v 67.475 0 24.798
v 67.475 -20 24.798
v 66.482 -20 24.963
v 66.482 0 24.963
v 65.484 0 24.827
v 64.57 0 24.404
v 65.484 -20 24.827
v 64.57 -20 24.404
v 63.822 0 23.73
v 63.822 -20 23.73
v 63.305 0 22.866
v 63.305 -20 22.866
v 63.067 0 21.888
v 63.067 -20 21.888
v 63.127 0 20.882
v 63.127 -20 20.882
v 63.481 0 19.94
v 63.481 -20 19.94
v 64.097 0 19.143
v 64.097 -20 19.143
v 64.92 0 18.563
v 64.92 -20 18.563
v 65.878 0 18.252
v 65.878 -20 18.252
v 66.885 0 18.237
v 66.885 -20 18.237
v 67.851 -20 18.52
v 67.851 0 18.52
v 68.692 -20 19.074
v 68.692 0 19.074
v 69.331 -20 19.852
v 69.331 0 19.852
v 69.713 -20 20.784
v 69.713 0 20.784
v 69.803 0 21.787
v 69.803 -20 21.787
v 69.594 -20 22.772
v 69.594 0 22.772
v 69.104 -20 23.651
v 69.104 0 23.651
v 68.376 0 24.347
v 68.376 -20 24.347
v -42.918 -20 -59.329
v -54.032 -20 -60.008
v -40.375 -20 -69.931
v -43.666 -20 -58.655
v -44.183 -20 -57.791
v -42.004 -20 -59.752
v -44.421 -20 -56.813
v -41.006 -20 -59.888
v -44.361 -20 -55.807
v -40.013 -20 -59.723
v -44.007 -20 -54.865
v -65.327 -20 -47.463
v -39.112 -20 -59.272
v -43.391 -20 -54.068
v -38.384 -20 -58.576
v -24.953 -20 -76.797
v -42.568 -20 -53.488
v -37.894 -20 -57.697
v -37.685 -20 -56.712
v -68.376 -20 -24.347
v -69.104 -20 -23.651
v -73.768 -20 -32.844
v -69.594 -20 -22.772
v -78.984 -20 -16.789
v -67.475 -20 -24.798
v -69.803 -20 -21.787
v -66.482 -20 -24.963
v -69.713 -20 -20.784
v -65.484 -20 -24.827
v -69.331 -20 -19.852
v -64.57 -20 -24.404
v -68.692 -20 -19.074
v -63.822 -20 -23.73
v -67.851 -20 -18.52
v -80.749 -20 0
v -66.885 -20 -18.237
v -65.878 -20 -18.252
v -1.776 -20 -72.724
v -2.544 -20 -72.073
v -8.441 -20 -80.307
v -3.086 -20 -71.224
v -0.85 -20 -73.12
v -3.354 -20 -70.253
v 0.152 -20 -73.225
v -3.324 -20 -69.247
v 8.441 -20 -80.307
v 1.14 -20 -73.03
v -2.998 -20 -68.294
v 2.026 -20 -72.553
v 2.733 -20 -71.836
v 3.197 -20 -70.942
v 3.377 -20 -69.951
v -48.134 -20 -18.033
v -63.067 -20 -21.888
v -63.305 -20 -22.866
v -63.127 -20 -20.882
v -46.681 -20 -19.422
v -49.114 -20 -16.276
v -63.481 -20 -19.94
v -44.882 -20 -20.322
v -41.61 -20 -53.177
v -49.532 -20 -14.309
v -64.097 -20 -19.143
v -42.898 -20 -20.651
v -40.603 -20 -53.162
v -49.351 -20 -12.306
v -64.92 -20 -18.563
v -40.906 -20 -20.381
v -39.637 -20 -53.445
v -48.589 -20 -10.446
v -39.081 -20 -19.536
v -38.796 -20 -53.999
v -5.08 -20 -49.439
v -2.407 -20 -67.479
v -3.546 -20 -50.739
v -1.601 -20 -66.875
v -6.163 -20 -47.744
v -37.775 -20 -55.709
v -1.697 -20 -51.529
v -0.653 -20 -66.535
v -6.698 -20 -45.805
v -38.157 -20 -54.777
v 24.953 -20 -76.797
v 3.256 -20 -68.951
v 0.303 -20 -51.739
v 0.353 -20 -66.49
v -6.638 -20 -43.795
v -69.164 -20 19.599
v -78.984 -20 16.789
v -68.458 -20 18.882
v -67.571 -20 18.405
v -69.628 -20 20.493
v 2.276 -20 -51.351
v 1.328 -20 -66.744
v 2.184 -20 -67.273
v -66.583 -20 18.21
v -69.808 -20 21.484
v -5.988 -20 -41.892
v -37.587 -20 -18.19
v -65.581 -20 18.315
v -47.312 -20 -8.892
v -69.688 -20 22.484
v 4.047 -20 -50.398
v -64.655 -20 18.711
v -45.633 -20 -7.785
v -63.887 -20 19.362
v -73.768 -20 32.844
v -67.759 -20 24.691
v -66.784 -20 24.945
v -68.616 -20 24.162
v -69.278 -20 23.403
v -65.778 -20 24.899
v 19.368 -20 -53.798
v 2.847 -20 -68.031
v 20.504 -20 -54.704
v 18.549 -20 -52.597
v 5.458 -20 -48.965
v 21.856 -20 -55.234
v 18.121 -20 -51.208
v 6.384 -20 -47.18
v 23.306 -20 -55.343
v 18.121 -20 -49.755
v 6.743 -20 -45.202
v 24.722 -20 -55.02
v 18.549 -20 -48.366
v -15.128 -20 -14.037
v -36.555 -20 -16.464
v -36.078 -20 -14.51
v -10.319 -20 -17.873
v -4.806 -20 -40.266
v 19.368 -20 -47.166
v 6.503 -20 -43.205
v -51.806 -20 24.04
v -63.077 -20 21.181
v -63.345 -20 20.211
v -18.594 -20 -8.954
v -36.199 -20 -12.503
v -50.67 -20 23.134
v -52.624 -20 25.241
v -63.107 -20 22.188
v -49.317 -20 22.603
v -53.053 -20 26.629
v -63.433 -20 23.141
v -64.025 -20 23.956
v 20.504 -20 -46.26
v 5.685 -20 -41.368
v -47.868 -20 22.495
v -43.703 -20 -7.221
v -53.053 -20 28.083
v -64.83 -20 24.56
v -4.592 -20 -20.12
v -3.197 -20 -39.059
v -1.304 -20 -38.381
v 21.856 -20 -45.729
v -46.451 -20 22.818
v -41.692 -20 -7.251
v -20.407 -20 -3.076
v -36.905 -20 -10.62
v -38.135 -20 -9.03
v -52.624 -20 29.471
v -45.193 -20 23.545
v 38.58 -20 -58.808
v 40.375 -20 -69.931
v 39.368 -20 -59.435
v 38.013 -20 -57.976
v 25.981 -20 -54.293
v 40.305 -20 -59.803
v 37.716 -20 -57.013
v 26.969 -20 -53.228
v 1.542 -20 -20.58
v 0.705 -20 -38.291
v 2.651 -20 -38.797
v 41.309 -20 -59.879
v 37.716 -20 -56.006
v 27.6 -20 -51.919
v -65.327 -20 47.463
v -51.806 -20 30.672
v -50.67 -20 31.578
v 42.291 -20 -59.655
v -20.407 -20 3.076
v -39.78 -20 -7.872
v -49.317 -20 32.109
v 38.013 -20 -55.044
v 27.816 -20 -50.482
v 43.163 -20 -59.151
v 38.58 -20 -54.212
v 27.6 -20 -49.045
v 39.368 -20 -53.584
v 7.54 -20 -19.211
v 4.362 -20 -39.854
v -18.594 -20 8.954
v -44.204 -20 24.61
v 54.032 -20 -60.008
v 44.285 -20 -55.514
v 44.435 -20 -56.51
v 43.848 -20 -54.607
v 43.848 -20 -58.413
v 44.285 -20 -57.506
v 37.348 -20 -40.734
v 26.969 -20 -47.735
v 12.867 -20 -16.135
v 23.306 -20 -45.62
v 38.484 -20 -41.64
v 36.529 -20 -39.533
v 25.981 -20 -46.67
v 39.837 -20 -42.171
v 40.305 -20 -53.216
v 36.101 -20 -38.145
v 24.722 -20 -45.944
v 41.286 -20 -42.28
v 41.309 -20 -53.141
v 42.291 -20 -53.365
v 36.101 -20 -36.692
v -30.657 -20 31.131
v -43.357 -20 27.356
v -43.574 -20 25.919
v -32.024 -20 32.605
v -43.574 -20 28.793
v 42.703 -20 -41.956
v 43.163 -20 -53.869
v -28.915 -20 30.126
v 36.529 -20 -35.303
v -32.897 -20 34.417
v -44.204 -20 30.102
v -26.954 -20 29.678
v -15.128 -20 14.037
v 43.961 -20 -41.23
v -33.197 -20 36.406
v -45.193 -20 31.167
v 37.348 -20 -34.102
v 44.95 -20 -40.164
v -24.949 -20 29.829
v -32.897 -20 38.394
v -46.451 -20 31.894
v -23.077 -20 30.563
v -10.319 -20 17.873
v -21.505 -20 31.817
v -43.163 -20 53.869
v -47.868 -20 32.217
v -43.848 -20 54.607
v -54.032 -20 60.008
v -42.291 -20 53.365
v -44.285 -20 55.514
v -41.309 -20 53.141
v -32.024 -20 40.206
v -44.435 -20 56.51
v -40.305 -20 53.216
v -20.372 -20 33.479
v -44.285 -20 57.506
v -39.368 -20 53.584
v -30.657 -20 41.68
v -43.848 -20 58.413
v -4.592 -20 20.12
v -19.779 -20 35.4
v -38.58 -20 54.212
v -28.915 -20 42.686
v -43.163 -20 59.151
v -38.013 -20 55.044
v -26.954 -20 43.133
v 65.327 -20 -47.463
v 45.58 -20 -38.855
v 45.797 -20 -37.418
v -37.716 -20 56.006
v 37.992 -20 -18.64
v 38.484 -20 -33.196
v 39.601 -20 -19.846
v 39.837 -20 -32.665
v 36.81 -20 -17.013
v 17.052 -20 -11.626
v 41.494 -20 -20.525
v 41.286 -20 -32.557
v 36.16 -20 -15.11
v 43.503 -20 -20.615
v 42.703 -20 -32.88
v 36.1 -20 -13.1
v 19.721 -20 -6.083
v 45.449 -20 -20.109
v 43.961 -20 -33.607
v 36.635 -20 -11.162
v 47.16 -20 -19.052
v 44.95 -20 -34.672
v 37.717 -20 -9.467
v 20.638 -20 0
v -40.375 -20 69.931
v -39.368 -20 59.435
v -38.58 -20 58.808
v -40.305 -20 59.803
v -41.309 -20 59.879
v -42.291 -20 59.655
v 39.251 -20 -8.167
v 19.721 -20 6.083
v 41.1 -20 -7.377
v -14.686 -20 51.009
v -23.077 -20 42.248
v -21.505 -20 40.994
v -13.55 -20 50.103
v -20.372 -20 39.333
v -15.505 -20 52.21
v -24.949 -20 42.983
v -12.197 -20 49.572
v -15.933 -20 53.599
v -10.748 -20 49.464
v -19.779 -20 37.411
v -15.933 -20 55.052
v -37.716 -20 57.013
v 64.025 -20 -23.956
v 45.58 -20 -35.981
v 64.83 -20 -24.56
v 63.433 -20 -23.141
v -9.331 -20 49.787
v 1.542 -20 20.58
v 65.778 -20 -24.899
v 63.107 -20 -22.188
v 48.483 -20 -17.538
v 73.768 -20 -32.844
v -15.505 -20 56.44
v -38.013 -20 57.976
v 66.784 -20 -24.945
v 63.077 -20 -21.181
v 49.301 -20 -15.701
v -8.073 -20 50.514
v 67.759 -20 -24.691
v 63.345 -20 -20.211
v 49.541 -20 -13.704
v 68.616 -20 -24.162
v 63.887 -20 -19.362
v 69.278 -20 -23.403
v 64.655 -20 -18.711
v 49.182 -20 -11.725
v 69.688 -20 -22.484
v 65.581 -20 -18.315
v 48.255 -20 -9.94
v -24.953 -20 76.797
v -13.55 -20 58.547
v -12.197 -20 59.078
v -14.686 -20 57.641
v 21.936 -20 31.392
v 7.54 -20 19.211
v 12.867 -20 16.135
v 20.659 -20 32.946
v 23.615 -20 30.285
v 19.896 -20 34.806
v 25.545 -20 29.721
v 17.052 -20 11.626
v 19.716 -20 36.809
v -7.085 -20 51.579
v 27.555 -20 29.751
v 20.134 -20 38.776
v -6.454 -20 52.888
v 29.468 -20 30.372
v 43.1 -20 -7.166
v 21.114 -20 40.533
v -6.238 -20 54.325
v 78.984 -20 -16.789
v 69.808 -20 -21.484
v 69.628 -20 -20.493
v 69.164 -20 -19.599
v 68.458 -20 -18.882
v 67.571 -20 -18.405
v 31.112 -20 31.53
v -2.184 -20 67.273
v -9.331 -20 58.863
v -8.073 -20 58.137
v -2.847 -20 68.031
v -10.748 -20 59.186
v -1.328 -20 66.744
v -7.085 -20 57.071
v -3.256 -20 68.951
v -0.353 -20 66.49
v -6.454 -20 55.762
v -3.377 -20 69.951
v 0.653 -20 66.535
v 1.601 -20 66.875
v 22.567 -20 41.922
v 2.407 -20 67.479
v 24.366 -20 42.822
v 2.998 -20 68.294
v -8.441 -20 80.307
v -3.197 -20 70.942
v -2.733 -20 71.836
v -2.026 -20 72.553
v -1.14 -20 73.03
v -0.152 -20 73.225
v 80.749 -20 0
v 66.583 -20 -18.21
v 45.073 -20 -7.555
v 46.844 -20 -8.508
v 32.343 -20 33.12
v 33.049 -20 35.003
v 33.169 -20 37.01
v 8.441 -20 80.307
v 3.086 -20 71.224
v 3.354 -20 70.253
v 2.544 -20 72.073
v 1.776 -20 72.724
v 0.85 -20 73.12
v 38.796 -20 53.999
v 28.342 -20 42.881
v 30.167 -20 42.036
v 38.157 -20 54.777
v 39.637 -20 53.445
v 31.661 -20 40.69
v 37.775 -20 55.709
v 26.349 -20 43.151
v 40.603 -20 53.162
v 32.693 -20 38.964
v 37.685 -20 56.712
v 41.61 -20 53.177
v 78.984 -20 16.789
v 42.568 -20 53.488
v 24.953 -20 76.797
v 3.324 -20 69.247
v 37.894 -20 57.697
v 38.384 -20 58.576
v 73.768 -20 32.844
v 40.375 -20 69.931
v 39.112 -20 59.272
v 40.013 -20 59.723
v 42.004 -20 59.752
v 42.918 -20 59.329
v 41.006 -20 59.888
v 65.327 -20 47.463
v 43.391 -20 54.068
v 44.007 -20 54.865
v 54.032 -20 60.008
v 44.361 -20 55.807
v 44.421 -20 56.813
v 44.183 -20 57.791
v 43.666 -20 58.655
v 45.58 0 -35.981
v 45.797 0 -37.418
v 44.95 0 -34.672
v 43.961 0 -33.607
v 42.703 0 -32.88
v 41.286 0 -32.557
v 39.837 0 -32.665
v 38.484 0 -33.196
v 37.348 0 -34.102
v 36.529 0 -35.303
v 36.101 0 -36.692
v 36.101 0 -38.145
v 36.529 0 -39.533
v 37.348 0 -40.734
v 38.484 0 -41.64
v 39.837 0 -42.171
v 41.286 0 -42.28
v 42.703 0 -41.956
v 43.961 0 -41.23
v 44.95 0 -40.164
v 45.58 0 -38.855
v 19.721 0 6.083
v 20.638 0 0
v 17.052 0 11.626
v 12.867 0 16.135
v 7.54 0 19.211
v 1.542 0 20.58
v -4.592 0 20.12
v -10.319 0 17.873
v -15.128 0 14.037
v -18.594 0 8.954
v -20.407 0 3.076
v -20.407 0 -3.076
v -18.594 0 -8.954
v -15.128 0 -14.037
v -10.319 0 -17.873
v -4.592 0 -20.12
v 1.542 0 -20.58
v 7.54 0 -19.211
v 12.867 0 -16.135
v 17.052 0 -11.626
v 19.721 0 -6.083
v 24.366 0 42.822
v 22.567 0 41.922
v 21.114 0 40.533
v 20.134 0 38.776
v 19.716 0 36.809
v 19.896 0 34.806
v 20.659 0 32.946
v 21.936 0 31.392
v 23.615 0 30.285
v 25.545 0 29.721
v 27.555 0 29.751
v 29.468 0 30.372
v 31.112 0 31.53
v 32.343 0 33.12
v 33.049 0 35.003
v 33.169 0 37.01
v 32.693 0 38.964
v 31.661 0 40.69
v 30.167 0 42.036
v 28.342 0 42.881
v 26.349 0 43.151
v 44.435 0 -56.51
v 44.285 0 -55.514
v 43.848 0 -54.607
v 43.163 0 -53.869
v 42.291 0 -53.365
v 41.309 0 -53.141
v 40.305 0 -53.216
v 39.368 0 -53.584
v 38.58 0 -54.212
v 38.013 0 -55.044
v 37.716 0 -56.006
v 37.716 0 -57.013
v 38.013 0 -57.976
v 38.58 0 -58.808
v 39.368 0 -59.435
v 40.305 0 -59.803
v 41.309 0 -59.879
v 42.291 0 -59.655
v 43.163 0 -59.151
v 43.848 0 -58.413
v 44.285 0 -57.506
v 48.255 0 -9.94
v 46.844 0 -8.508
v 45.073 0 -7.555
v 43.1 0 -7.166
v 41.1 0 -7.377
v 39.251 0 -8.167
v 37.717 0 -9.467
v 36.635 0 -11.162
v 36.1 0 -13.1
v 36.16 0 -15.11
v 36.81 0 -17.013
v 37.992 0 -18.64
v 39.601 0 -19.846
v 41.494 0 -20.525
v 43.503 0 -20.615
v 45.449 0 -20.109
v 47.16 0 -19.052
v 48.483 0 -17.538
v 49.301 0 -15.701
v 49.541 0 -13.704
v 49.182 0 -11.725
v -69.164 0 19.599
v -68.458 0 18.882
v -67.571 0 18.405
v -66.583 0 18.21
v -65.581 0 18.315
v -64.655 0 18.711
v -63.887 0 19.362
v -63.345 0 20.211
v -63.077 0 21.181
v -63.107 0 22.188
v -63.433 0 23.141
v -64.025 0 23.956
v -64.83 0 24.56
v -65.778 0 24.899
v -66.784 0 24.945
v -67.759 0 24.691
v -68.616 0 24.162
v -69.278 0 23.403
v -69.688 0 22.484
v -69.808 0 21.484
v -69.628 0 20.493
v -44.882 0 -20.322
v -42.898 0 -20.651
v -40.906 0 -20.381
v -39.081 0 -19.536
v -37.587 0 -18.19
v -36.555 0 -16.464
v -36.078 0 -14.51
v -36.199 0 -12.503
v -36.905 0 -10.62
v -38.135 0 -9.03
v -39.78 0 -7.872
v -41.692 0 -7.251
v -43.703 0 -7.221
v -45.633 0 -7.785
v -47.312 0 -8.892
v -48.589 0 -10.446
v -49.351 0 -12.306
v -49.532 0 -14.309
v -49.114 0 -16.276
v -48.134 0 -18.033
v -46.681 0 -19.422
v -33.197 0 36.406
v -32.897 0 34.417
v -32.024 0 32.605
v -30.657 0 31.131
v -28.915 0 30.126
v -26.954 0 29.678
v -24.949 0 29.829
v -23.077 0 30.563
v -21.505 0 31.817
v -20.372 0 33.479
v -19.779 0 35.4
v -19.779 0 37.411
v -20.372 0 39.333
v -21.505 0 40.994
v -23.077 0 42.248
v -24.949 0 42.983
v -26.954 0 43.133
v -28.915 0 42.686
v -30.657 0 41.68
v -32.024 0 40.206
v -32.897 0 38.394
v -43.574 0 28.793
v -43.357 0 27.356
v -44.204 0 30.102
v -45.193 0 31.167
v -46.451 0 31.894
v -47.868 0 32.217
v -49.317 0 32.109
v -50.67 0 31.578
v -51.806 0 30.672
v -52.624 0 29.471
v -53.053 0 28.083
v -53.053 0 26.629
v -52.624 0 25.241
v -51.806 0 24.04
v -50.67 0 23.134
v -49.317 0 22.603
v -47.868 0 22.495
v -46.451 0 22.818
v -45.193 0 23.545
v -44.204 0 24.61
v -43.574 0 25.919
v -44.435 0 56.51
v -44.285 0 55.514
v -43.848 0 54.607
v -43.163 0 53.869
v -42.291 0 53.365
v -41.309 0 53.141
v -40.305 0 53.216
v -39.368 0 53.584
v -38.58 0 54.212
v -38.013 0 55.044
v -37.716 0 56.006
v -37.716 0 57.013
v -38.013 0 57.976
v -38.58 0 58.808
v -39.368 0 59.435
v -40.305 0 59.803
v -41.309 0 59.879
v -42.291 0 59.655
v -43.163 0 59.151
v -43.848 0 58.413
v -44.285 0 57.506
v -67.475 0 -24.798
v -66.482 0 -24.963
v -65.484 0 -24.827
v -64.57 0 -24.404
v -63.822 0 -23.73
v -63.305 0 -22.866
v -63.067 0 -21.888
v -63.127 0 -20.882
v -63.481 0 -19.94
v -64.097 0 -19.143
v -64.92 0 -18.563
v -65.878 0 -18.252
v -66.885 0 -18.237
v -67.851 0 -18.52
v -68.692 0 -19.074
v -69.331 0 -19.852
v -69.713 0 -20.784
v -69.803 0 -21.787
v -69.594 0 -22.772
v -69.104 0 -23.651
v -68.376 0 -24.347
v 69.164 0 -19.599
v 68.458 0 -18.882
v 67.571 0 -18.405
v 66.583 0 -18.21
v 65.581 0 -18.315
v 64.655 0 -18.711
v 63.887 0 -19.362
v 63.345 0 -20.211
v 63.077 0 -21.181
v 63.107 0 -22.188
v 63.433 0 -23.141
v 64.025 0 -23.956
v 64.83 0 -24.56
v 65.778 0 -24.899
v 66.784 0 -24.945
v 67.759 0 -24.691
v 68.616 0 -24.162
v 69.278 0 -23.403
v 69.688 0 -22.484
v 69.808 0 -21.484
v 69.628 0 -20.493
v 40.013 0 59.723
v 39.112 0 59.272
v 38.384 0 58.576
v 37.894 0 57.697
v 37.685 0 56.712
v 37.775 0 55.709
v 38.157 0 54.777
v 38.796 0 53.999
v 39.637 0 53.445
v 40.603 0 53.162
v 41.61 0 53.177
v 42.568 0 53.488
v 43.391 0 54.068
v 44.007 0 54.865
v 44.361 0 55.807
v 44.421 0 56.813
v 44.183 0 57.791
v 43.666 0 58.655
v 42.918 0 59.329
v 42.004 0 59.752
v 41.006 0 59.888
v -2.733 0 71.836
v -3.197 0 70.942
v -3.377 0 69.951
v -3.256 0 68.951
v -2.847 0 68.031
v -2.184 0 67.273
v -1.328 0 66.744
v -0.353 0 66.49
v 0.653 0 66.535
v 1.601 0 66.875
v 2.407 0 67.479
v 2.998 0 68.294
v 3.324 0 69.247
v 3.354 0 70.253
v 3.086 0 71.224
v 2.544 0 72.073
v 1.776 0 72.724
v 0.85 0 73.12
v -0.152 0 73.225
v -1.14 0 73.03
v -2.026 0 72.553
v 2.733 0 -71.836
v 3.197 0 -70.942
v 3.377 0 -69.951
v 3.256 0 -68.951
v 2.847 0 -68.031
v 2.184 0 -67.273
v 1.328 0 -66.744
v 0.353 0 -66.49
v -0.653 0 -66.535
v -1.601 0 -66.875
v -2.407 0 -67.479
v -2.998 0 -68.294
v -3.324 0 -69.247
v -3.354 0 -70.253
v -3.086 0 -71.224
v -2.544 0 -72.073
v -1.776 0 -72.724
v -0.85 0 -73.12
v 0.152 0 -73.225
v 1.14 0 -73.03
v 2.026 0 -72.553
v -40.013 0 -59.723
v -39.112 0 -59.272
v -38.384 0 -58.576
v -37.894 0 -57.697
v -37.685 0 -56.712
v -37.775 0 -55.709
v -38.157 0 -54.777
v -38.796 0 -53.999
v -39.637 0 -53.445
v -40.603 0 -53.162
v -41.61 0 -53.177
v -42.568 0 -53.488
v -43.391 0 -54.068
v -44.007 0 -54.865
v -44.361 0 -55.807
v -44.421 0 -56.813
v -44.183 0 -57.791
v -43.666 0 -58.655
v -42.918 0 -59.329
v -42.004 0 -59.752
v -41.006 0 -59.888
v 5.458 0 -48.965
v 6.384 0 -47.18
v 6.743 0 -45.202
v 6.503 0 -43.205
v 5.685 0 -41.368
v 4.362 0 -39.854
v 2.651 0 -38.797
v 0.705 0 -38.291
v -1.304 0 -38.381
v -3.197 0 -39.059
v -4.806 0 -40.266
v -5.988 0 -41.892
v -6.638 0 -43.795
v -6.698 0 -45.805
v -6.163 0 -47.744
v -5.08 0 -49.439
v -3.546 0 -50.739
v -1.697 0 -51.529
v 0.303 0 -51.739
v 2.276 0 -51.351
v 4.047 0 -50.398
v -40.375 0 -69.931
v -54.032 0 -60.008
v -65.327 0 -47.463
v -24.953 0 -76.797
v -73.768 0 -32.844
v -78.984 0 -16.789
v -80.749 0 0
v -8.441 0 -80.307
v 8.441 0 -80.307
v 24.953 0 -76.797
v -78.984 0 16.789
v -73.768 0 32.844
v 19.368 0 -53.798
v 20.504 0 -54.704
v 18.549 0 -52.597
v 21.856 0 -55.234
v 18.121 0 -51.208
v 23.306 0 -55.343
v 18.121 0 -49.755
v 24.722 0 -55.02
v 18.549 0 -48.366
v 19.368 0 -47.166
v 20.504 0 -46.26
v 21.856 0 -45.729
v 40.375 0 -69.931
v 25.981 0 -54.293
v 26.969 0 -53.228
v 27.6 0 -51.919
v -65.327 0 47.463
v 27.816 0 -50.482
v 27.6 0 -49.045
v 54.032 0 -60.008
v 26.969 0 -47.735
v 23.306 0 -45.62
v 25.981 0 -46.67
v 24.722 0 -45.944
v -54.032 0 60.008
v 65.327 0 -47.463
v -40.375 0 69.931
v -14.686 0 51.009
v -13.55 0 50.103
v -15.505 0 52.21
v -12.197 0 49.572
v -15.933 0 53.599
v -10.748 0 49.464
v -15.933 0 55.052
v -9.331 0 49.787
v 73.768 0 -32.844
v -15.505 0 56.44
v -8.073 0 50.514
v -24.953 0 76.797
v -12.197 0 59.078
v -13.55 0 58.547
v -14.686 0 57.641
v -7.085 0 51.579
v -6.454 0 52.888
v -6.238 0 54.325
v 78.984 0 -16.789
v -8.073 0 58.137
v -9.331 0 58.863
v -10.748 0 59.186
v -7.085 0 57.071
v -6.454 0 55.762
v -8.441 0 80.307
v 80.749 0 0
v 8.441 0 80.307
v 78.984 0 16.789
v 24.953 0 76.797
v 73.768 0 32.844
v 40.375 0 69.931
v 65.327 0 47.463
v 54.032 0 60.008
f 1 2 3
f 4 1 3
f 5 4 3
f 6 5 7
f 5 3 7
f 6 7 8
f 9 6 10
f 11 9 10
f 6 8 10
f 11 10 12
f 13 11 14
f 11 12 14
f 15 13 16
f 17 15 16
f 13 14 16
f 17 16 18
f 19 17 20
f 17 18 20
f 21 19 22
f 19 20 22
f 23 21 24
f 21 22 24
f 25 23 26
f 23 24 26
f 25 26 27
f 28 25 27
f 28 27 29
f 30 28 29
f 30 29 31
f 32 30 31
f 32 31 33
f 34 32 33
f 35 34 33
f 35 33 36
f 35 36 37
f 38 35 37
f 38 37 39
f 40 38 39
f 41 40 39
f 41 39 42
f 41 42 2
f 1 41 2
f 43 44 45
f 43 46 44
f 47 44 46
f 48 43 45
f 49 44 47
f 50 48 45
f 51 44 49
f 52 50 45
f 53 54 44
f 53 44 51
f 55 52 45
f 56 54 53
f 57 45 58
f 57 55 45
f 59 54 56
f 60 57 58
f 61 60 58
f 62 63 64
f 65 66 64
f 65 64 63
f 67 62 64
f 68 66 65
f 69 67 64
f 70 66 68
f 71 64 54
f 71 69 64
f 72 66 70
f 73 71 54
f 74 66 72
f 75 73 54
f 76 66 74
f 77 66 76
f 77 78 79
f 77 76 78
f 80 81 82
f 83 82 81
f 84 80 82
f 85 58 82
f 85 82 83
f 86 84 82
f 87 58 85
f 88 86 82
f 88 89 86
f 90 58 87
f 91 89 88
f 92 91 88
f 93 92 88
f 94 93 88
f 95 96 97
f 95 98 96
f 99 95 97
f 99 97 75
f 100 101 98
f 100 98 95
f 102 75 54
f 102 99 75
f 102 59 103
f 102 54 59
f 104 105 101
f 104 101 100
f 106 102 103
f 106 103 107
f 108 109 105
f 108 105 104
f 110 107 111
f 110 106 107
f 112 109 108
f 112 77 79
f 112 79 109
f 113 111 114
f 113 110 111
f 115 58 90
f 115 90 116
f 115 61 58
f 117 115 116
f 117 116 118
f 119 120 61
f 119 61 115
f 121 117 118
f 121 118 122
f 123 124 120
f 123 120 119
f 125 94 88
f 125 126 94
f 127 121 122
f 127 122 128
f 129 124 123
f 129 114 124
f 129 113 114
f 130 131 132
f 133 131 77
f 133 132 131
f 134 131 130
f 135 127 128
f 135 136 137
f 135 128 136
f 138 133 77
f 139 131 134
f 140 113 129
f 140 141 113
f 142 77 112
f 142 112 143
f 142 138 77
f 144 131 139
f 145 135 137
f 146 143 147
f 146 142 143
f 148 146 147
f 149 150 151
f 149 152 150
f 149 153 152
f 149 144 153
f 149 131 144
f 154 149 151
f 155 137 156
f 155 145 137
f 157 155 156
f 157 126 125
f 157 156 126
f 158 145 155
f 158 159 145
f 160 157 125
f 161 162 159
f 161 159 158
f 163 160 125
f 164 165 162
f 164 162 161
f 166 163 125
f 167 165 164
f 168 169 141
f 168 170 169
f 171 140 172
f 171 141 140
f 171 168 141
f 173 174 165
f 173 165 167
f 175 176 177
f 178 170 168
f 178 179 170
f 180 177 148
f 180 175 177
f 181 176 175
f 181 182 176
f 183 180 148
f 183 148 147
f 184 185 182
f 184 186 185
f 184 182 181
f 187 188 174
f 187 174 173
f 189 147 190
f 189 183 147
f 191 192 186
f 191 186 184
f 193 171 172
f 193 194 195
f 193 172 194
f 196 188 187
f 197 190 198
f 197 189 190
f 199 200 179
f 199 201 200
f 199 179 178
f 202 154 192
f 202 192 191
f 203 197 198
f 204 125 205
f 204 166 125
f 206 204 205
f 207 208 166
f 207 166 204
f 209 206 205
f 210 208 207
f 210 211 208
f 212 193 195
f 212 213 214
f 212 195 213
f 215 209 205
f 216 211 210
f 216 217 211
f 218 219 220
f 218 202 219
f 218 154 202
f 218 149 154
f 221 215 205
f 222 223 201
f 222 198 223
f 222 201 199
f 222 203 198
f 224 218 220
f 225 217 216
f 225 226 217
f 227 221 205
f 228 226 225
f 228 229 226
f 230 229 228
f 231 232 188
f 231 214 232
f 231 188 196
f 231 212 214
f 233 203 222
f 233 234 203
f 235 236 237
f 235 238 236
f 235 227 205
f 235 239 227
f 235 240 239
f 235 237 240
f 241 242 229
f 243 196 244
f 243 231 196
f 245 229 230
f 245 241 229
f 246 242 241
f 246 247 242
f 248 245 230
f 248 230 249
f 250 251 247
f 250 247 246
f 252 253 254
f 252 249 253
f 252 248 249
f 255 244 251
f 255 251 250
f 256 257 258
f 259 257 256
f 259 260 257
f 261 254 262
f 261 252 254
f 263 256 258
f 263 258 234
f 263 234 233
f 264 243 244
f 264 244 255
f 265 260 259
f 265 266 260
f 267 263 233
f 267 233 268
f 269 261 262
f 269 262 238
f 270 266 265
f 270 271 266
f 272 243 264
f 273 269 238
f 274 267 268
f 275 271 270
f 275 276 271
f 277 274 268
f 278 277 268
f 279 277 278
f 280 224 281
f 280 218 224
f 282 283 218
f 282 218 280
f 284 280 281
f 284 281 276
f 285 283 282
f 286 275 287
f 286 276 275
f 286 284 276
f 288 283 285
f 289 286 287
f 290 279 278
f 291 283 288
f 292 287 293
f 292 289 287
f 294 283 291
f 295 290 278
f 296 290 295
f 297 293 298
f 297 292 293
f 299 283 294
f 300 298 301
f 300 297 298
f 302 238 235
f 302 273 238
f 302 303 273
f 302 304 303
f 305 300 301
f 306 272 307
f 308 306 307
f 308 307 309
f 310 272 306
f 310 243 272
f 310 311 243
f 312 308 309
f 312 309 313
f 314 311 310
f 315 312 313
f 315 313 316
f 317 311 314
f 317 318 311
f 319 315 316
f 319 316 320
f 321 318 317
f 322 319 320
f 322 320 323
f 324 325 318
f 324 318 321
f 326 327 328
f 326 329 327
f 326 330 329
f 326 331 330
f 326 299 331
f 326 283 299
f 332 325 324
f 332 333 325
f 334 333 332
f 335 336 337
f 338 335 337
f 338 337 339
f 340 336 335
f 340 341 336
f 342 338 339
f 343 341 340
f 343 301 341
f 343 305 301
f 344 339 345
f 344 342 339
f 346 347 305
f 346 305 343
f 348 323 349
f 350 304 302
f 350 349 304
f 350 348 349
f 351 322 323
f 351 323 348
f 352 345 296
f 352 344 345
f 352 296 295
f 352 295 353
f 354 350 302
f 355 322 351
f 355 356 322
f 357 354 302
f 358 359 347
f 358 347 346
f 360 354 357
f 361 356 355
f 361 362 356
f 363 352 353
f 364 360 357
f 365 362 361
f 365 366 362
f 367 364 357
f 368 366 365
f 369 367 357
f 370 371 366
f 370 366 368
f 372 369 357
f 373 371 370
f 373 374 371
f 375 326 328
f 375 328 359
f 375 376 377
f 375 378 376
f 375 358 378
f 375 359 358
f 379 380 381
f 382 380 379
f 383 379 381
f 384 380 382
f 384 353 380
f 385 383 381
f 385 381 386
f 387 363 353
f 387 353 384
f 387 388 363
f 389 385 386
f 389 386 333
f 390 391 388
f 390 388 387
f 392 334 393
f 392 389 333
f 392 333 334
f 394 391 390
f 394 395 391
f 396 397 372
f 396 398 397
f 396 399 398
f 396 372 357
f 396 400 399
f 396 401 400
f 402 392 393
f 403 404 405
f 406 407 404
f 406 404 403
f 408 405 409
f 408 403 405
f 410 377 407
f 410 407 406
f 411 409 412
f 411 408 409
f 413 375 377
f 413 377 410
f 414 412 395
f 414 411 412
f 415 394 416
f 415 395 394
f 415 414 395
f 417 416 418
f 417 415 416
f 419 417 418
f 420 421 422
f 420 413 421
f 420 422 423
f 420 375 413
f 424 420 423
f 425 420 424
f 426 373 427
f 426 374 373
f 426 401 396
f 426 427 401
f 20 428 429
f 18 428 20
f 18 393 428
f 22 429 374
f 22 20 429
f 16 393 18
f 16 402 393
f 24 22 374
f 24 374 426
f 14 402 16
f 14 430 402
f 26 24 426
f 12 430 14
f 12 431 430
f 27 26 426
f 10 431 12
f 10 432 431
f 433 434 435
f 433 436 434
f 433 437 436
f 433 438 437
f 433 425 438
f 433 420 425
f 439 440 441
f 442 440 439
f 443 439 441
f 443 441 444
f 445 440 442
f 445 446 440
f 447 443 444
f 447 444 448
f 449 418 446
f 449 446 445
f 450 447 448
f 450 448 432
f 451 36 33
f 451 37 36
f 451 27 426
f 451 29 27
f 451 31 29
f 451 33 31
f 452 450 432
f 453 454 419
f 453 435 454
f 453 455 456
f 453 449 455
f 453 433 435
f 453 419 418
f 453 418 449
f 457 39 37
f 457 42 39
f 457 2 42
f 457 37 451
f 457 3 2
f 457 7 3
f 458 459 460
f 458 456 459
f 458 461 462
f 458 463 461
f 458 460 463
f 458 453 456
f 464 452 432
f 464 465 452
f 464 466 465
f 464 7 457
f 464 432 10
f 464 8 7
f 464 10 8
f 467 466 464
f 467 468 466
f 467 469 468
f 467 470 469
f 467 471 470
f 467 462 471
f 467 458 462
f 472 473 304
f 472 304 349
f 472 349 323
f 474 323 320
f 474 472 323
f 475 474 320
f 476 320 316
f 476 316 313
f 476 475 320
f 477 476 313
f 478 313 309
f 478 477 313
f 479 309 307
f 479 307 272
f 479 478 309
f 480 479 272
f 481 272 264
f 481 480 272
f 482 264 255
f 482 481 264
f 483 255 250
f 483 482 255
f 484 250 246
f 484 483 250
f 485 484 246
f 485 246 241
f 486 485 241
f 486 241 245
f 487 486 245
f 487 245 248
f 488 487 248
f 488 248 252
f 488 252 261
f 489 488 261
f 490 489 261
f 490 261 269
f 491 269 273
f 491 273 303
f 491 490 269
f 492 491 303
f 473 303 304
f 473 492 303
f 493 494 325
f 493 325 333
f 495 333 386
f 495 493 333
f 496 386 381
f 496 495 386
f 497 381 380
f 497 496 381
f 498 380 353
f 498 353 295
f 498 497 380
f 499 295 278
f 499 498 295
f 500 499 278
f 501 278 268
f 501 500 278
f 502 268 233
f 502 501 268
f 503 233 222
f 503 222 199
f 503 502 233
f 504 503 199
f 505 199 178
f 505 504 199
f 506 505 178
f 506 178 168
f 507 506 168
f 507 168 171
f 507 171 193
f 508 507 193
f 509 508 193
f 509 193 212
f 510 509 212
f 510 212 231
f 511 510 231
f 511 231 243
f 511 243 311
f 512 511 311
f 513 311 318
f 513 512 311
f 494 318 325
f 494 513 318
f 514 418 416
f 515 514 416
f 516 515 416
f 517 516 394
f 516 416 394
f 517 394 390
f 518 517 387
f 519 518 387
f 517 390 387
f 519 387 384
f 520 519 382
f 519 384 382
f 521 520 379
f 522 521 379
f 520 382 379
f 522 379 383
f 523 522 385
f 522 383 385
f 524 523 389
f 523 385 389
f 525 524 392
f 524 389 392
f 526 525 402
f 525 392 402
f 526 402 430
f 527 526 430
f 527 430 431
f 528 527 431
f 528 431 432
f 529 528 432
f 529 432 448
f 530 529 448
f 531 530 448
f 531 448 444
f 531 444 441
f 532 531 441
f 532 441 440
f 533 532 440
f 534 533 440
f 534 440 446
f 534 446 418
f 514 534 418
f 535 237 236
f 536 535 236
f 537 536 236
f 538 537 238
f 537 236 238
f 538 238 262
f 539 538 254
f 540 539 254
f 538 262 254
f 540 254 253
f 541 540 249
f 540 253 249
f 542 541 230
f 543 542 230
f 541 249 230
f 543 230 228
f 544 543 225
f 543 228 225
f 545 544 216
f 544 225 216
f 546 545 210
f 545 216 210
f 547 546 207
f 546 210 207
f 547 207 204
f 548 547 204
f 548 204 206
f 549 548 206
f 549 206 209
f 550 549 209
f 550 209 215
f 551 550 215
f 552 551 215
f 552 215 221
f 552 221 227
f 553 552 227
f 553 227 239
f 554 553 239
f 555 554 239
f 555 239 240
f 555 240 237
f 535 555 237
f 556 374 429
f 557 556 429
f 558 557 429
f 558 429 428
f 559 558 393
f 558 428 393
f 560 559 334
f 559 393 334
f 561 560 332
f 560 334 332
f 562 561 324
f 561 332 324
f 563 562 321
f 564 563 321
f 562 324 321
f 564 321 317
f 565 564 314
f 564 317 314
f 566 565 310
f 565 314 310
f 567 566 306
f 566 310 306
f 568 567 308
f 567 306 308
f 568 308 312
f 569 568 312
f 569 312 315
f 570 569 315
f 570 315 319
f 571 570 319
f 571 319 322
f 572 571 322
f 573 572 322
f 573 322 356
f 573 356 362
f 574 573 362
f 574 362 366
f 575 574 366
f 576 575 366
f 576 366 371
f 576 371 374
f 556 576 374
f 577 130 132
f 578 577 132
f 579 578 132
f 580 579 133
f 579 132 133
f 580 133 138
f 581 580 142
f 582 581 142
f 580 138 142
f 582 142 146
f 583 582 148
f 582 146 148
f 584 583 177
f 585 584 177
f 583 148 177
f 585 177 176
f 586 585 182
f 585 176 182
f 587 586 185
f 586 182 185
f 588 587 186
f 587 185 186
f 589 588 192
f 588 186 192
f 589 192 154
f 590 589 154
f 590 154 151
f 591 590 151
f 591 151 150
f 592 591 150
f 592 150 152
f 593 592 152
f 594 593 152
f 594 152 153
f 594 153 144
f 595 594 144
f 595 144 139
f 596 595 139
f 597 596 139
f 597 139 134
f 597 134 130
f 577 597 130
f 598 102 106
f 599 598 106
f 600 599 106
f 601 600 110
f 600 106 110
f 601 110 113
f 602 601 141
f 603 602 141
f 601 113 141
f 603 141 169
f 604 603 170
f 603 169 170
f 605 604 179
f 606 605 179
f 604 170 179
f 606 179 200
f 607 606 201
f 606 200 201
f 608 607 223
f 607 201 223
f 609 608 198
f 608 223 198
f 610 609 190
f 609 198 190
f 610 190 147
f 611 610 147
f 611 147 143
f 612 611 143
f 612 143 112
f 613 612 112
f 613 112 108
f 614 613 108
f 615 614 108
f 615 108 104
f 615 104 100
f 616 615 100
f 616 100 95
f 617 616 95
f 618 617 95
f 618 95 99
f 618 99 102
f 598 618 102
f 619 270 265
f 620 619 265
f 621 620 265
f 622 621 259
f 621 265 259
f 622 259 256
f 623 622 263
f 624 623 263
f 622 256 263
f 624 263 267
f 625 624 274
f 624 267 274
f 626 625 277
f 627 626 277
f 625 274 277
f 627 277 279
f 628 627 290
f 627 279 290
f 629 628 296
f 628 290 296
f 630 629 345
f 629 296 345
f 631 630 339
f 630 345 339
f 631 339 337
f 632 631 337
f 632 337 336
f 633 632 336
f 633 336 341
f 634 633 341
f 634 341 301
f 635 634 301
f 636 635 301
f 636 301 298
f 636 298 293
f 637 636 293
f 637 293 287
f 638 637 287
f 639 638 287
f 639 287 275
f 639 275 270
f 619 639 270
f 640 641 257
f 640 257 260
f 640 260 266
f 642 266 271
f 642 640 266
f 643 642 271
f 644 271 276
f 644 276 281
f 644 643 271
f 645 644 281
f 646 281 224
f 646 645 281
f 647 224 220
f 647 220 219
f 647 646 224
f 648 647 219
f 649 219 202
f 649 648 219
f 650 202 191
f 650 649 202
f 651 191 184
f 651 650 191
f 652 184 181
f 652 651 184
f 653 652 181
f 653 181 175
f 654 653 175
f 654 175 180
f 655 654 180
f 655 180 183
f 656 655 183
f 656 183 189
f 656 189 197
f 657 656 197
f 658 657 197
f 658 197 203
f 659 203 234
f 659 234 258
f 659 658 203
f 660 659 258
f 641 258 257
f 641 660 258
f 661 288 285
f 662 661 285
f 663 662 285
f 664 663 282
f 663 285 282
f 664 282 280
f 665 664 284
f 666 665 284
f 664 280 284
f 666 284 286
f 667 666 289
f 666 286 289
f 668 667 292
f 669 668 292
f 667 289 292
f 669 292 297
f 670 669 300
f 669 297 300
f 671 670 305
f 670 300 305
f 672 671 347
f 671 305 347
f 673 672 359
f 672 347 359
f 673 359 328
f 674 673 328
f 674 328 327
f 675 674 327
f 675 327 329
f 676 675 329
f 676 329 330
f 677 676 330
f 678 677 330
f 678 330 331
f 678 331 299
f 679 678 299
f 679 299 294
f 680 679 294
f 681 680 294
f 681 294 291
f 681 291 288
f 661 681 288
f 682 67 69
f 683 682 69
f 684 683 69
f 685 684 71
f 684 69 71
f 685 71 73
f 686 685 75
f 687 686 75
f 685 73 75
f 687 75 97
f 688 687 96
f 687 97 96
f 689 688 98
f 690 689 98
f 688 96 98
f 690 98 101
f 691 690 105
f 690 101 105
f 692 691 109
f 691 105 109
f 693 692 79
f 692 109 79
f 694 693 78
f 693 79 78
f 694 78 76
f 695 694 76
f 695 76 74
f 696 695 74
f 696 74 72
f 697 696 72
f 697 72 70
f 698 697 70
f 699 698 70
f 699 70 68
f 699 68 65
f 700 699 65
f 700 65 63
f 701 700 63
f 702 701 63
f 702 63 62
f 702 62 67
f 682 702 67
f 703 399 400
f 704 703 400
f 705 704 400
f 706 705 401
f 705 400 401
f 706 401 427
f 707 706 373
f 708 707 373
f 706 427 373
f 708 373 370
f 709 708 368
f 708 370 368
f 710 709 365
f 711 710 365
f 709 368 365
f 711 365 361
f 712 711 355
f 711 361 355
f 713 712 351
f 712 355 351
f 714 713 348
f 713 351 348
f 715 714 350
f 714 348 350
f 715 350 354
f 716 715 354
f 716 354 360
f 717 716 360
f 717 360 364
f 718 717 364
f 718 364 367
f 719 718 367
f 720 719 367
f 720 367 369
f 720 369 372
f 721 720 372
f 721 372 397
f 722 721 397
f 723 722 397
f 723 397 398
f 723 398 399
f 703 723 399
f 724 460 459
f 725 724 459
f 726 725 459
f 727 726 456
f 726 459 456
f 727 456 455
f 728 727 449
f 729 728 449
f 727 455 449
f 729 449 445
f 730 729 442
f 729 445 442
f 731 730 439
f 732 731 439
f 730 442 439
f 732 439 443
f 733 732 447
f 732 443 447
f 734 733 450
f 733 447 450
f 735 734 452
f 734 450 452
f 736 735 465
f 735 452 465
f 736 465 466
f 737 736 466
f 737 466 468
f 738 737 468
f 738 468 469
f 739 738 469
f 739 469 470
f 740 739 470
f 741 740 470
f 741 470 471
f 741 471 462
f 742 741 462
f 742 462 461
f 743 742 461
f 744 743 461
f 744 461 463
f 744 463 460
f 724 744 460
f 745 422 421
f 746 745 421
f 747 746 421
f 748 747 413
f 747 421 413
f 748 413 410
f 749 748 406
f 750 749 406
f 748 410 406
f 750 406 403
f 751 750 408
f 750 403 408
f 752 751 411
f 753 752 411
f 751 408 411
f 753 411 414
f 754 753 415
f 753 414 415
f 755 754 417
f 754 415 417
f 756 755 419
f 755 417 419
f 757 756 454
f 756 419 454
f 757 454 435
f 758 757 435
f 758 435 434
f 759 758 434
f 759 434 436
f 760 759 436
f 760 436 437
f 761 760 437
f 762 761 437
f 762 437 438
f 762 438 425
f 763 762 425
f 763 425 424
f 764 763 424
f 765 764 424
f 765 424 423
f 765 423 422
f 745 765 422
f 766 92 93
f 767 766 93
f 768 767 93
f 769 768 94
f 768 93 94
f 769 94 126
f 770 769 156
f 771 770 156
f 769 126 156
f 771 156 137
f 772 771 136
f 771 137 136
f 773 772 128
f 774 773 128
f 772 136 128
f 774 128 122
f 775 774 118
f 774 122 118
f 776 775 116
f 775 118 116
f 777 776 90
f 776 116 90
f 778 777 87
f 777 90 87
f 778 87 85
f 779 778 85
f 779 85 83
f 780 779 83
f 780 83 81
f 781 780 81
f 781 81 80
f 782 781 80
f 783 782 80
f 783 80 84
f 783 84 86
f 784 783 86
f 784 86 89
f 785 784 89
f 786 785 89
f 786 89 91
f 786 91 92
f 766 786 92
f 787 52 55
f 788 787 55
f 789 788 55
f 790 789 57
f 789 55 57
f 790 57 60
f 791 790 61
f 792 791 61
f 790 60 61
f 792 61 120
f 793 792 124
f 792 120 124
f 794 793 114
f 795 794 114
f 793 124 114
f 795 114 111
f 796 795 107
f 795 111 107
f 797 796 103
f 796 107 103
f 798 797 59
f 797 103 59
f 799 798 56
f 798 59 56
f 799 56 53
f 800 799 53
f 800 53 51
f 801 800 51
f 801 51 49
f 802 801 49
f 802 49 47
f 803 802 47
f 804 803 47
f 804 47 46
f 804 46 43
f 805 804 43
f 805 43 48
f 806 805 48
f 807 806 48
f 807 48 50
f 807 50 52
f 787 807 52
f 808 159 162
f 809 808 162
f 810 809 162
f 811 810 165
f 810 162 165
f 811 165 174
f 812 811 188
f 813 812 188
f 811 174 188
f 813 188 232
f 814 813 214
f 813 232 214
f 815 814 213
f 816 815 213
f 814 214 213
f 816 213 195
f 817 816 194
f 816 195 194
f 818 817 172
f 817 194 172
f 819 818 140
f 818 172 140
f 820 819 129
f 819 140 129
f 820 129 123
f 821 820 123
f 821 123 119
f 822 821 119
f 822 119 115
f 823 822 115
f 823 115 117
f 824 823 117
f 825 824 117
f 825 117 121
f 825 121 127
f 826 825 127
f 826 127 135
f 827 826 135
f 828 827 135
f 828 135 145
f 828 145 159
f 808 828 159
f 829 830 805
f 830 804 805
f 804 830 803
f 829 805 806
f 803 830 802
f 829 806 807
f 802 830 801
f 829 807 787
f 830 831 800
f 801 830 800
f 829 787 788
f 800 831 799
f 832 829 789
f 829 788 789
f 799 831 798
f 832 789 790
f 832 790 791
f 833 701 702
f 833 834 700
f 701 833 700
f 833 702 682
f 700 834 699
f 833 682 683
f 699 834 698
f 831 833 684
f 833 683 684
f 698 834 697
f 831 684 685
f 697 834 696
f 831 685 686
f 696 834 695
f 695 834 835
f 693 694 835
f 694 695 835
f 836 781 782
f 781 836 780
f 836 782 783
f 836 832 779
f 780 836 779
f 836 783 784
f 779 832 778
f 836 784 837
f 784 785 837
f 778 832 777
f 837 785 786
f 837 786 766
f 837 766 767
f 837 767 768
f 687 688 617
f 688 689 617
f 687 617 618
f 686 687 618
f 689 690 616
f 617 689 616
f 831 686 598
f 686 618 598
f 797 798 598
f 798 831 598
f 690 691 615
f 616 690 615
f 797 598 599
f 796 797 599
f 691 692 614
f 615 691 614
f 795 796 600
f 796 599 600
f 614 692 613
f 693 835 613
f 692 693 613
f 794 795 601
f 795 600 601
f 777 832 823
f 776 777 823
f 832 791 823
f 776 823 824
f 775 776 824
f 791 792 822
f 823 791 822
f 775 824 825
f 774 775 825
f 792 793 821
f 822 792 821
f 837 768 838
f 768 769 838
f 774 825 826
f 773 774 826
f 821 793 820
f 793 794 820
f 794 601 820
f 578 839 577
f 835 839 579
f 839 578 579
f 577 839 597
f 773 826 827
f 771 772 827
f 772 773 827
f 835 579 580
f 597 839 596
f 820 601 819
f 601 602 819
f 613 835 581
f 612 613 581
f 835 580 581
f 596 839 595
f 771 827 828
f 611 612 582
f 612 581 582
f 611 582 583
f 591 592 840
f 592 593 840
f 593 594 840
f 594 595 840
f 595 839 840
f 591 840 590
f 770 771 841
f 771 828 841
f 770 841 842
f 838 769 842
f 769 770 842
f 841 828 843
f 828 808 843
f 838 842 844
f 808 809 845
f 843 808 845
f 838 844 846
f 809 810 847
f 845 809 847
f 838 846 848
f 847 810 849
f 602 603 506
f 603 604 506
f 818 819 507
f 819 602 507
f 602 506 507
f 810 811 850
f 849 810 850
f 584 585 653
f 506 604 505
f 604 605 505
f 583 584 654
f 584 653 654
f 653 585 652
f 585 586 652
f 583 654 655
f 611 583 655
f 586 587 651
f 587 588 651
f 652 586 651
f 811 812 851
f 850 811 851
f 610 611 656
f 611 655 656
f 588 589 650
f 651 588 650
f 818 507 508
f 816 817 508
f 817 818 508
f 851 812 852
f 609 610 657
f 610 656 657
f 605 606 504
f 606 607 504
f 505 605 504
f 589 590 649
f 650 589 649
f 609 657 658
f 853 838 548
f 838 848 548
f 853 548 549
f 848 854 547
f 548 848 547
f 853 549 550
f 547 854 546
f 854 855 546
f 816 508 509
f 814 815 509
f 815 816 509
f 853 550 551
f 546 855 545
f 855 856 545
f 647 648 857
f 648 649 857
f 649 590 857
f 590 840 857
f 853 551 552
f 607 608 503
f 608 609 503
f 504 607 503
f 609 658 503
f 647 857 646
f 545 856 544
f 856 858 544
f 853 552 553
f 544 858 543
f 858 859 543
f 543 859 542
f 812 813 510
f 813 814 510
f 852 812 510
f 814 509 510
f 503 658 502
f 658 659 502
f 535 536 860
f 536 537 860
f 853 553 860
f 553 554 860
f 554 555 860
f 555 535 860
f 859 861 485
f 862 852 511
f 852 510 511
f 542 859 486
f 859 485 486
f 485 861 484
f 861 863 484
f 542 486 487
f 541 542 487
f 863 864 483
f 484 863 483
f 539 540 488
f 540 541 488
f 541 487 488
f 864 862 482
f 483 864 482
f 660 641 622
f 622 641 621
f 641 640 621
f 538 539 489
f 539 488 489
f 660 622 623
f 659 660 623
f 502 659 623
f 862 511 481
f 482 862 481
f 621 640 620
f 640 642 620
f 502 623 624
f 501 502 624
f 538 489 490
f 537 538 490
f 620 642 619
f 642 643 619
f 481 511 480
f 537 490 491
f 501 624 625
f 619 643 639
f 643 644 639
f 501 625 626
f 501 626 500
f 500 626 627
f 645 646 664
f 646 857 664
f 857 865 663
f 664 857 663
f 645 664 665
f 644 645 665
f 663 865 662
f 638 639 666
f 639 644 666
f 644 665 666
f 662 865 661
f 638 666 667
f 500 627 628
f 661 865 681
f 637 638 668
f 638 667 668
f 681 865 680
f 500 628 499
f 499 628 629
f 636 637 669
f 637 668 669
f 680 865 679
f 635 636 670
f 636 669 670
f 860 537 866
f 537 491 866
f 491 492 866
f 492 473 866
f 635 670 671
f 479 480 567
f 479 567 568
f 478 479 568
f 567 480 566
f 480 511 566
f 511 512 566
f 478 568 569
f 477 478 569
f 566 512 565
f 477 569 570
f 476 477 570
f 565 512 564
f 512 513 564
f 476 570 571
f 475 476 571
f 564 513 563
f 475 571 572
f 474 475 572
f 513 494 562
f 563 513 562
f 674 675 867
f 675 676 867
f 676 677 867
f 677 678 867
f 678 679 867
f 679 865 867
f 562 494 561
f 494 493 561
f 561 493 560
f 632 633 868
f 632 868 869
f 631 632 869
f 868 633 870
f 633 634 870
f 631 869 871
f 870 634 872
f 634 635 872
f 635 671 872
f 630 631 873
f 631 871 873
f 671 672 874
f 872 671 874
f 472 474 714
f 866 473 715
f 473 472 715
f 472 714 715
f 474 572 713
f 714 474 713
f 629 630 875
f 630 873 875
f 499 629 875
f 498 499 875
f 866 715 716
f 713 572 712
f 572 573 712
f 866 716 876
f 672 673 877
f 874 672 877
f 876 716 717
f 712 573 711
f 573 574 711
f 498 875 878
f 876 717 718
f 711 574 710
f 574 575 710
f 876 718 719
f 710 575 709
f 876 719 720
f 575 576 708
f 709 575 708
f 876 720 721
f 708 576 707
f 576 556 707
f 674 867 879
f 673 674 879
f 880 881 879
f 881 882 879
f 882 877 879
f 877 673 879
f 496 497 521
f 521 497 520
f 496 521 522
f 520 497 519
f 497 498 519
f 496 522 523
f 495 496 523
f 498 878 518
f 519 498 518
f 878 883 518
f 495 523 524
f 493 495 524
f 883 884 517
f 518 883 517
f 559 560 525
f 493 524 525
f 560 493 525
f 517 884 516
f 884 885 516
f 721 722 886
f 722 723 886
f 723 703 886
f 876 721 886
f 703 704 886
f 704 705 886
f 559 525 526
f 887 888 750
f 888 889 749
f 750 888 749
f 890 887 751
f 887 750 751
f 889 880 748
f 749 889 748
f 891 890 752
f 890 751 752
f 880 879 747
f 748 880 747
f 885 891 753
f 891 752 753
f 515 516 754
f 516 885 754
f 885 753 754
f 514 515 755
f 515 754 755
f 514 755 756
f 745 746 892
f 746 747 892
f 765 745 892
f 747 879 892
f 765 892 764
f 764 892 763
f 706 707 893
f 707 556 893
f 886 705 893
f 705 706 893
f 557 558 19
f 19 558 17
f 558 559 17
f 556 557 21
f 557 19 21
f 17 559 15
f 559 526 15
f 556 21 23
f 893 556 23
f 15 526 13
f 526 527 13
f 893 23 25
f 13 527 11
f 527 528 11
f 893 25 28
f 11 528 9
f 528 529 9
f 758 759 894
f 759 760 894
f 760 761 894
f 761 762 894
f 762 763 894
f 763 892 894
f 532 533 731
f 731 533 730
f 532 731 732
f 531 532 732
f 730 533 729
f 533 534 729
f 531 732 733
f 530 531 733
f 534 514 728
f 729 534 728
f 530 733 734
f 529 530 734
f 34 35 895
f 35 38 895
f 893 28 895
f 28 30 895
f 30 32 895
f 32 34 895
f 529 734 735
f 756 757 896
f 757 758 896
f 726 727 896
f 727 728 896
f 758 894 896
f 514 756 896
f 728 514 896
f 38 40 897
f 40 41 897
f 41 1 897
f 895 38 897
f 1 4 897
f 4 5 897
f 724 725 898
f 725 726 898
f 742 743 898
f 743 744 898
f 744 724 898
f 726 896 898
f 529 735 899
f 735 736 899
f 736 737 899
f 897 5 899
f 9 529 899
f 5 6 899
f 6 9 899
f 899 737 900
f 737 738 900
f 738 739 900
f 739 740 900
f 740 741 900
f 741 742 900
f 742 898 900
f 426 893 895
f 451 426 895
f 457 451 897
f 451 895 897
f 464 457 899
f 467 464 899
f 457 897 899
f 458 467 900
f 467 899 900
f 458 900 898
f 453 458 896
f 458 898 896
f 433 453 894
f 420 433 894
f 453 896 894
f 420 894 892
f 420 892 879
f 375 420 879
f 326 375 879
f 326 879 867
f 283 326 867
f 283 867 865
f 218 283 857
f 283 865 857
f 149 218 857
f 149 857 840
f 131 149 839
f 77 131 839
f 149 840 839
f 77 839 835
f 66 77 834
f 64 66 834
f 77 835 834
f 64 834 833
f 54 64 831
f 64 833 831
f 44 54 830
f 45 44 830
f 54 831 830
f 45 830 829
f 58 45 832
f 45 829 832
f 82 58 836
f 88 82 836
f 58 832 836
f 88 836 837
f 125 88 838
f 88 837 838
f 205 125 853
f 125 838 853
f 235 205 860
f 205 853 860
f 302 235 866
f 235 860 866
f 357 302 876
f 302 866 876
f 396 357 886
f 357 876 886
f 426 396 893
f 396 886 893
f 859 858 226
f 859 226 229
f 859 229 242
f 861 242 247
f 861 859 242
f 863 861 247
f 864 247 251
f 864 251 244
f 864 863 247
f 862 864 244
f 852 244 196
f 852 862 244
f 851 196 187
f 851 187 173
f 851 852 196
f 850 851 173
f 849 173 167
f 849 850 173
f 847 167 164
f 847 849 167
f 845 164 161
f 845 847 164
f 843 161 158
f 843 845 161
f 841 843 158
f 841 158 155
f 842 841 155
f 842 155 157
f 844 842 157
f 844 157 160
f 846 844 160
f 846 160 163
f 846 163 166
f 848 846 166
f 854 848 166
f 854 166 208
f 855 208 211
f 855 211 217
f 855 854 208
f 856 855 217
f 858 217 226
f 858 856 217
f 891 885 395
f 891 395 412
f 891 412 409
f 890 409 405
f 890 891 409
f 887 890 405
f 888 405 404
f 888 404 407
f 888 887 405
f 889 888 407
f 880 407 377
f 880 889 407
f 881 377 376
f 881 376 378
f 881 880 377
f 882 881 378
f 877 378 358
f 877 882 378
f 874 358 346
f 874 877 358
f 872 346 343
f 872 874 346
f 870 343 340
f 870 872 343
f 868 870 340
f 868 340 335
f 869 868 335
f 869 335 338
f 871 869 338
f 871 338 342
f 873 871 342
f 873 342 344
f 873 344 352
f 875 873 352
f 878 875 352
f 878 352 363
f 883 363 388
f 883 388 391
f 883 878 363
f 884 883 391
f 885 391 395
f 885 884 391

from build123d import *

# Parameters (mm, degrees)
F0_R            = 80.749
F0_R_2          = 4.875
F0_R_3          = 20.6375
F1_DEPTH        = 20
F2_D            = 13.49248
F2_COPIES_COUNT = 5
F3_D            = 6.7564
F3_COPIES_COUNT = 10


# Not quite as in the source:
# - a pattern or mirror of a feature is missing from the dataset's text; its kind, count and spacing are read off the source's solid
# - a feature names something its author has since deleted; it is built from what else it names


with BuildPart() as f1:
    # F0 (on Front) → F1 (new body)
    with BuildSketch(Plane.XZ):
        Circle(F0_R)
        with Locations((-22.9412823532, -50.481680479)):
            Circle(F0_R_2, mode=Mode.SUBTRACT)
        with Locations((-40.9216850532, -37.4181532468)):
            Circle(F0_R_2, mode=Mode.SUBTRACT)
        Circle(F0_R_3, mode=Mode.SUBTRACT)
        with Locations((22.9412823532, -50.481680479)):
            Circle(F0_R_2, mode=Mode.SUBTRACT)
        with Locations((40.9216850532, -37.4181532468)):
            Circle(F0_R_2, mode=Mode.SUBTRACT)
        with Locations((-55.100177293, 6.2187589016)):
            Circle(F0_R_2, mode=Mode.SUBTRACT)
        with Locations((-48.2322745931, 27.3559899762)):
            Circle(F0_R_2, mode=Mode.SUBTRACT)
        with Locations((-11.1125, 54.3250848481)):
            Circle(F0_R_2, mode=Mode.SUBTRACT)
        with Locations((55.100177293, 6.2187589016)):
            Circle(F0_R_2, mode=Mode.SUBTRACT)
        with Locations((48.2322745931, 27.3559899762)):
            Circle(F0_R_2, mode=Mode.SUBTRACT)
        with Locations((11.1125, 54.3250848481)):
            Circle(F0_R_2, mode=Mode.SUBTRACT)
        with Locations((-55.100177293, 6.2187589016)):
            Circle(F0_R_2)
        with Locations((-40.9216850532, -37.4181532468)):
            Circle(F0_R_2)
        with Locations((-22.9412823532, -50.481680479)):
            Circle(F0_R_2)
        with Locations((55.100177293, 6.2187589016)):
            Circle(F0_R_2)
        with Locations((48.2322745931, 27.3559899762)):
            Circle(F0_R_2)
        with Locations((11.1125, 54.3250848481)):
            Circle(F0_R_2)
    extrude(amount=F1_DEPTH)

    # F2 (through all)
    with Locations(Plane(origin=(0, 0, 0), x_dir=(1, 0, 0), z_dir=(0, 1, 0))):
        with Locations((-26.4503363532, -36.4057647469)):
            f2 = Hole(F2_D / 2)

    # F2_copies: F2 ×5 about axis
    f2_copies_axis = Axis((0, 0, 0), (0, 1, 0))
    for i in range(1, F2_COPIES_COUNT):
        add(f2.rotate(f2_copies_axis, i * 360 / F2_COPIES_COUNT), mode=Mode.SUBTRACT)

    # F3 (through all)
    with Locations(Plane(origin=(0, 0, 0), x_dir=(1, 0, 0), z_dir=(0, 1, 0))):
        with Locations((-41.0567998726, -56.5098370571)):
            f3 = Hole(F3_D / 2)

    # F3_copies: F3 ×10 about axis
    f3_copies_axis = Axis((0, 0, 0), (0, 1, 0))
    for i in range(1, F3_COPIES_COUNT):
        add(f3.rotate(f3_copies_axis, i * 360 / F3_COPIES_COUNT), mode=Mode.SUBTRACT)


solid = f1.part
